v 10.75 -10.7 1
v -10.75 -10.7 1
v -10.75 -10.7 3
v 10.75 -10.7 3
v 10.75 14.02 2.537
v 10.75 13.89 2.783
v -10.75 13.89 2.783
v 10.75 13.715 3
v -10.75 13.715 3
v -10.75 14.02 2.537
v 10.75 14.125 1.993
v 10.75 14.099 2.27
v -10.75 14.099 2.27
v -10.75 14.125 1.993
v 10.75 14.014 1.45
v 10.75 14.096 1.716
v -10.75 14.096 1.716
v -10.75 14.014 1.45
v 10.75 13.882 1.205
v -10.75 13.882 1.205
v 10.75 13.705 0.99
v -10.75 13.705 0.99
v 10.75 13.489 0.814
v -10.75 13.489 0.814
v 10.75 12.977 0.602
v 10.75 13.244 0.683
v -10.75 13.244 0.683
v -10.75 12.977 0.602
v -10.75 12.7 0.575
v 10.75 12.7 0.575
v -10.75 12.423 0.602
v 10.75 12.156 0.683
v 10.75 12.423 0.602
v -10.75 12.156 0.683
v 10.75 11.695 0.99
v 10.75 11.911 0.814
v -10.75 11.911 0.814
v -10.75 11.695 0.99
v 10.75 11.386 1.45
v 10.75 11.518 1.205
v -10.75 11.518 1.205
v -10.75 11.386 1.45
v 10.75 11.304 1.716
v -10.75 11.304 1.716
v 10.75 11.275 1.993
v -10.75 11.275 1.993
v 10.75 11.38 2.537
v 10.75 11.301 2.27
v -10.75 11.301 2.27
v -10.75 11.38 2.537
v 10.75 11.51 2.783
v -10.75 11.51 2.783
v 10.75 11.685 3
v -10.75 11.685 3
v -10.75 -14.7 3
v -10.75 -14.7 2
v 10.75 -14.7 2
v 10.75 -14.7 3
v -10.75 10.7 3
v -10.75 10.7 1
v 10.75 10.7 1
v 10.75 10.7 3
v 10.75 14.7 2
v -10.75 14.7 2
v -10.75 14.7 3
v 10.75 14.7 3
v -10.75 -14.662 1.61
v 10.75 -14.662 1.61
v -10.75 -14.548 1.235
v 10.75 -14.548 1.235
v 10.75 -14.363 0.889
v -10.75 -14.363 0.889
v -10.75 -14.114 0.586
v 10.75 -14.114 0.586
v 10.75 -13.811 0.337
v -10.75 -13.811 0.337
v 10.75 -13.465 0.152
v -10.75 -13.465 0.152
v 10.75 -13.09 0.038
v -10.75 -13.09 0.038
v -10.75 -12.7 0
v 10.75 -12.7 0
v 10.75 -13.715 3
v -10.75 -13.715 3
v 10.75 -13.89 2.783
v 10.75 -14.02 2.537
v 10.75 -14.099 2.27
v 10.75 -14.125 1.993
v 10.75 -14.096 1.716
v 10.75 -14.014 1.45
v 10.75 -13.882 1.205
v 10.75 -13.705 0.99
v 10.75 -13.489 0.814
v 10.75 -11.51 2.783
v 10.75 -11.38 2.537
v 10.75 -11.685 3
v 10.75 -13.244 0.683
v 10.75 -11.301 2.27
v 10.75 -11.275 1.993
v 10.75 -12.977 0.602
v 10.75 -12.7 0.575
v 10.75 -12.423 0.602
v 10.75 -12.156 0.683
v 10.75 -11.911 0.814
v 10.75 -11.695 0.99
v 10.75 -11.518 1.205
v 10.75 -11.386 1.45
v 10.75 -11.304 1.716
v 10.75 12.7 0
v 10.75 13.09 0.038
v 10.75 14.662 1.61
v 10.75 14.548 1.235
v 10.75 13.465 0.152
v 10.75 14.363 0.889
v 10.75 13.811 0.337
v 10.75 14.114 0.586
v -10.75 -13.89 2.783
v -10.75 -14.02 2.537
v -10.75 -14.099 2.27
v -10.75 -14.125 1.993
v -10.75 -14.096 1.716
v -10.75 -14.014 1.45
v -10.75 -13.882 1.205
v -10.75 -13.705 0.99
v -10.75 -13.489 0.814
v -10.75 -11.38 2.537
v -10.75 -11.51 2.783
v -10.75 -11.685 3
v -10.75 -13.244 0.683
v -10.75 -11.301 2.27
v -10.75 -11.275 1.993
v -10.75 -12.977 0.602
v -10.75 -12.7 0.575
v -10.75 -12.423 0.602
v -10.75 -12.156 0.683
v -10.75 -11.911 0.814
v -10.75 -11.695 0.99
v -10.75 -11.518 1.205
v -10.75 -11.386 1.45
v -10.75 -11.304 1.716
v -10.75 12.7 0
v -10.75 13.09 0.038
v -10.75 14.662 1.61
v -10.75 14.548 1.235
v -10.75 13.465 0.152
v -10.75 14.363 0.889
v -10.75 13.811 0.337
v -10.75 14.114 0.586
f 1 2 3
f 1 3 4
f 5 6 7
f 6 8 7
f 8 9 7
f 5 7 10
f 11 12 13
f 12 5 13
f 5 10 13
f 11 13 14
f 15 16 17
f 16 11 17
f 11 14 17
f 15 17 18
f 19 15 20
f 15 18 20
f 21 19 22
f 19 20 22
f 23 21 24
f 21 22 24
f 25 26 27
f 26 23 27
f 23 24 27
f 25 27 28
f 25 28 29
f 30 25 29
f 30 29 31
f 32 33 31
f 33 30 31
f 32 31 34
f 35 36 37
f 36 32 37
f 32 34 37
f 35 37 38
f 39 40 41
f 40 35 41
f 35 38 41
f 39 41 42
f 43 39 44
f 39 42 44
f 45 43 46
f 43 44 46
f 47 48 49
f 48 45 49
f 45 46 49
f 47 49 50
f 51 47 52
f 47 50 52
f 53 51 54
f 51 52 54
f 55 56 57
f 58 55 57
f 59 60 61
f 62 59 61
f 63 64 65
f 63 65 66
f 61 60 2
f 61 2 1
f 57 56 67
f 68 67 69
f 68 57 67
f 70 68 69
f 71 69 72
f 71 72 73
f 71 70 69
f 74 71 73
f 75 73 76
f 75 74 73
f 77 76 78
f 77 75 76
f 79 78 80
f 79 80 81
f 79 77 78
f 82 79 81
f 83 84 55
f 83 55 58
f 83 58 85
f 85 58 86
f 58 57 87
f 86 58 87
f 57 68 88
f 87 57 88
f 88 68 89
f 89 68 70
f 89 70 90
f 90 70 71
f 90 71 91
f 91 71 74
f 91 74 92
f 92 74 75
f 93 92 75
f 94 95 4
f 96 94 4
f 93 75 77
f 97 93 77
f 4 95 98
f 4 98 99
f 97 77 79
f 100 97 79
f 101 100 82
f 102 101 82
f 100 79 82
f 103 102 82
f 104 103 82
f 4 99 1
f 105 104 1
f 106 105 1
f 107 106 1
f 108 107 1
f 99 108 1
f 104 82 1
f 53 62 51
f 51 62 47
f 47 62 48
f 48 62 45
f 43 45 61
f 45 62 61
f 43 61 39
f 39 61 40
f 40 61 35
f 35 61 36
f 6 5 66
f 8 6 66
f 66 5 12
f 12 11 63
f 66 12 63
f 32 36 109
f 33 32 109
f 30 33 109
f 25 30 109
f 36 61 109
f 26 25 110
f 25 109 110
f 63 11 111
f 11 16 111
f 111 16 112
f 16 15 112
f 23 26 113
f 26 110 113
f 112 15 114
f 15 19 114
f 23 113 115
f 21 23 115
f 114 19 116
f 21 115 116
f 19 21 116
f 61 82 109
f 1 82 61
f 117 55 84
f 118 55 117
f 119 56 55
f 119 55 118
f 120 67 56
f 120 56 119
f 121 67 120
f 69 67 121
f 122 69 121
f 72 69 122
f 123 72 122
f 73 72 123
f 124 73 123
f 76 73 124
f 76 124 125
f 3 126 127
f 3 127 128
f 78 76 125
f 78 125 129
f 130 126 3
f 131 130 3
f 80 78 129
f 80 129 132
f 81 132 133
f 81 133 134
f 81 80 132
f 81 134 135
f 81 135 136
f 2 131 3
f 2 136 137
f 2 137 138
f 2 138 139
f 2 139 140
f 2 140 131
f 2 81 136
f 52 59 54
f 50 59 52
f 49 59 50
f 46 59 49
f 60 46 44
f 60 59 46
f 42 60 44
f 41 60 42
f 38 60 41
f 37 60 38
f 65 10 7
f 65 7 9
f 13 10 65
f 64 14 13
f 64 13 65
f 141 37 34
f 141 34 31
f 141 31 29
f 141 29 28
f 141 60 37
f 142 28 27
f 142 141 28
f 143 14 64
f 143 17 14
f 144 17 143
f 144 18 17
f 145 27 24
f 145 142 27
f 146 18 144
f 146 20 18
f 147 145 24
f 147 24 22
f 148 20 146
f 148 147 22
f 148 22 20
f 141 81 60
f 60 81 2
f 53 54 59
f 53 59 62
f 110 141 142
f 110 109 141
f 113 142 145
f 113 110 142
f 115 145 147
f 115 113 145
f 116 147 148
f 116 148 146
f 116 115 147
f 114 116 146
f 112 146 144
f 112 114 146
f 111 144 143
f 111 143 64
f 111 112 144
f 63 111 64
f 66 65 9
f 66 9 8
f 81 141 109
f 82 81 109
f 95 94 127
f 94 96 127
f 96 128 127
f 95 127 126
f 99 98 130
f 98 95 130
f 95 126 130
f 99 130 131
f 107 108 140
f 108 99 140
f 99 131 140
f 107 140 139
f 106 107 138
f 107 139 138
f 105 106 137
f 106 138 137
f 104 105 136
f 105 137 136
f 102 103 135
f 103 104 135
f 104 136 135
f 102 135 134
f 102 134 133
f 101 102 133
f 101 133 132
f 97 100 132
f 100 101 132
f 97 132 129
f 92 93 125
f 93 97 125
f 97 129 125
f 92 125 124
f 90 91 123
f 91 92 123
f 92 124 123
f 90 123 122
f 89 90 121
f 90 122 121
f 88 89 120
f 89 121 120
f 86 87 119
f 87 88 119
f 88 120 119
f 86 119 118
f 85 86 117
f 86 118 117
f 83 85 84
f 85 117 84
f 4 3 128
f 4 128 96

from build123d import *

# Parameters (mm, degrees)
F0_W     = 21.5
F0_H     = 21.4
F1_DEPTH = 1
F0_H_2   = 4
F2_DEPTH = 3
F4_D     = 2.85
F5_R     = 2


with BuildPart() as f1:
    # F0 (on Top) → F1 (new body)
    with BuildSketch(Plane.XY):
        Rectangle(F0_W, F0_H)
    extrude(amount=F1_DEPTH)

    # F0 (on Top) → F2 (join)
    with BuildSketch(Plane.XY):
        with Locations((0, 12.7)):
            Rectangle(F0_W, F0_H_2)
        with Locations((0, -12.7)):
            Rectangle(F0_W, F0_H_2)
    extrude(amount=F2_DEPTH)

    # F4 (through all)
    with Locations(Plane.YZ.offset(10.75)):
        with Locations((12.7, 2), (-12.7, 2)):
            Hole(F4_D / 2)

    # F5
    f5_edges = [f1.edges().sort_by_distance(p)[0] for p in [
        (0, 14.7, 0),
        (0, -14.7, 0),
    ]]
    fillet(f5_edges, radius=F5_R)


solid = f1.part
